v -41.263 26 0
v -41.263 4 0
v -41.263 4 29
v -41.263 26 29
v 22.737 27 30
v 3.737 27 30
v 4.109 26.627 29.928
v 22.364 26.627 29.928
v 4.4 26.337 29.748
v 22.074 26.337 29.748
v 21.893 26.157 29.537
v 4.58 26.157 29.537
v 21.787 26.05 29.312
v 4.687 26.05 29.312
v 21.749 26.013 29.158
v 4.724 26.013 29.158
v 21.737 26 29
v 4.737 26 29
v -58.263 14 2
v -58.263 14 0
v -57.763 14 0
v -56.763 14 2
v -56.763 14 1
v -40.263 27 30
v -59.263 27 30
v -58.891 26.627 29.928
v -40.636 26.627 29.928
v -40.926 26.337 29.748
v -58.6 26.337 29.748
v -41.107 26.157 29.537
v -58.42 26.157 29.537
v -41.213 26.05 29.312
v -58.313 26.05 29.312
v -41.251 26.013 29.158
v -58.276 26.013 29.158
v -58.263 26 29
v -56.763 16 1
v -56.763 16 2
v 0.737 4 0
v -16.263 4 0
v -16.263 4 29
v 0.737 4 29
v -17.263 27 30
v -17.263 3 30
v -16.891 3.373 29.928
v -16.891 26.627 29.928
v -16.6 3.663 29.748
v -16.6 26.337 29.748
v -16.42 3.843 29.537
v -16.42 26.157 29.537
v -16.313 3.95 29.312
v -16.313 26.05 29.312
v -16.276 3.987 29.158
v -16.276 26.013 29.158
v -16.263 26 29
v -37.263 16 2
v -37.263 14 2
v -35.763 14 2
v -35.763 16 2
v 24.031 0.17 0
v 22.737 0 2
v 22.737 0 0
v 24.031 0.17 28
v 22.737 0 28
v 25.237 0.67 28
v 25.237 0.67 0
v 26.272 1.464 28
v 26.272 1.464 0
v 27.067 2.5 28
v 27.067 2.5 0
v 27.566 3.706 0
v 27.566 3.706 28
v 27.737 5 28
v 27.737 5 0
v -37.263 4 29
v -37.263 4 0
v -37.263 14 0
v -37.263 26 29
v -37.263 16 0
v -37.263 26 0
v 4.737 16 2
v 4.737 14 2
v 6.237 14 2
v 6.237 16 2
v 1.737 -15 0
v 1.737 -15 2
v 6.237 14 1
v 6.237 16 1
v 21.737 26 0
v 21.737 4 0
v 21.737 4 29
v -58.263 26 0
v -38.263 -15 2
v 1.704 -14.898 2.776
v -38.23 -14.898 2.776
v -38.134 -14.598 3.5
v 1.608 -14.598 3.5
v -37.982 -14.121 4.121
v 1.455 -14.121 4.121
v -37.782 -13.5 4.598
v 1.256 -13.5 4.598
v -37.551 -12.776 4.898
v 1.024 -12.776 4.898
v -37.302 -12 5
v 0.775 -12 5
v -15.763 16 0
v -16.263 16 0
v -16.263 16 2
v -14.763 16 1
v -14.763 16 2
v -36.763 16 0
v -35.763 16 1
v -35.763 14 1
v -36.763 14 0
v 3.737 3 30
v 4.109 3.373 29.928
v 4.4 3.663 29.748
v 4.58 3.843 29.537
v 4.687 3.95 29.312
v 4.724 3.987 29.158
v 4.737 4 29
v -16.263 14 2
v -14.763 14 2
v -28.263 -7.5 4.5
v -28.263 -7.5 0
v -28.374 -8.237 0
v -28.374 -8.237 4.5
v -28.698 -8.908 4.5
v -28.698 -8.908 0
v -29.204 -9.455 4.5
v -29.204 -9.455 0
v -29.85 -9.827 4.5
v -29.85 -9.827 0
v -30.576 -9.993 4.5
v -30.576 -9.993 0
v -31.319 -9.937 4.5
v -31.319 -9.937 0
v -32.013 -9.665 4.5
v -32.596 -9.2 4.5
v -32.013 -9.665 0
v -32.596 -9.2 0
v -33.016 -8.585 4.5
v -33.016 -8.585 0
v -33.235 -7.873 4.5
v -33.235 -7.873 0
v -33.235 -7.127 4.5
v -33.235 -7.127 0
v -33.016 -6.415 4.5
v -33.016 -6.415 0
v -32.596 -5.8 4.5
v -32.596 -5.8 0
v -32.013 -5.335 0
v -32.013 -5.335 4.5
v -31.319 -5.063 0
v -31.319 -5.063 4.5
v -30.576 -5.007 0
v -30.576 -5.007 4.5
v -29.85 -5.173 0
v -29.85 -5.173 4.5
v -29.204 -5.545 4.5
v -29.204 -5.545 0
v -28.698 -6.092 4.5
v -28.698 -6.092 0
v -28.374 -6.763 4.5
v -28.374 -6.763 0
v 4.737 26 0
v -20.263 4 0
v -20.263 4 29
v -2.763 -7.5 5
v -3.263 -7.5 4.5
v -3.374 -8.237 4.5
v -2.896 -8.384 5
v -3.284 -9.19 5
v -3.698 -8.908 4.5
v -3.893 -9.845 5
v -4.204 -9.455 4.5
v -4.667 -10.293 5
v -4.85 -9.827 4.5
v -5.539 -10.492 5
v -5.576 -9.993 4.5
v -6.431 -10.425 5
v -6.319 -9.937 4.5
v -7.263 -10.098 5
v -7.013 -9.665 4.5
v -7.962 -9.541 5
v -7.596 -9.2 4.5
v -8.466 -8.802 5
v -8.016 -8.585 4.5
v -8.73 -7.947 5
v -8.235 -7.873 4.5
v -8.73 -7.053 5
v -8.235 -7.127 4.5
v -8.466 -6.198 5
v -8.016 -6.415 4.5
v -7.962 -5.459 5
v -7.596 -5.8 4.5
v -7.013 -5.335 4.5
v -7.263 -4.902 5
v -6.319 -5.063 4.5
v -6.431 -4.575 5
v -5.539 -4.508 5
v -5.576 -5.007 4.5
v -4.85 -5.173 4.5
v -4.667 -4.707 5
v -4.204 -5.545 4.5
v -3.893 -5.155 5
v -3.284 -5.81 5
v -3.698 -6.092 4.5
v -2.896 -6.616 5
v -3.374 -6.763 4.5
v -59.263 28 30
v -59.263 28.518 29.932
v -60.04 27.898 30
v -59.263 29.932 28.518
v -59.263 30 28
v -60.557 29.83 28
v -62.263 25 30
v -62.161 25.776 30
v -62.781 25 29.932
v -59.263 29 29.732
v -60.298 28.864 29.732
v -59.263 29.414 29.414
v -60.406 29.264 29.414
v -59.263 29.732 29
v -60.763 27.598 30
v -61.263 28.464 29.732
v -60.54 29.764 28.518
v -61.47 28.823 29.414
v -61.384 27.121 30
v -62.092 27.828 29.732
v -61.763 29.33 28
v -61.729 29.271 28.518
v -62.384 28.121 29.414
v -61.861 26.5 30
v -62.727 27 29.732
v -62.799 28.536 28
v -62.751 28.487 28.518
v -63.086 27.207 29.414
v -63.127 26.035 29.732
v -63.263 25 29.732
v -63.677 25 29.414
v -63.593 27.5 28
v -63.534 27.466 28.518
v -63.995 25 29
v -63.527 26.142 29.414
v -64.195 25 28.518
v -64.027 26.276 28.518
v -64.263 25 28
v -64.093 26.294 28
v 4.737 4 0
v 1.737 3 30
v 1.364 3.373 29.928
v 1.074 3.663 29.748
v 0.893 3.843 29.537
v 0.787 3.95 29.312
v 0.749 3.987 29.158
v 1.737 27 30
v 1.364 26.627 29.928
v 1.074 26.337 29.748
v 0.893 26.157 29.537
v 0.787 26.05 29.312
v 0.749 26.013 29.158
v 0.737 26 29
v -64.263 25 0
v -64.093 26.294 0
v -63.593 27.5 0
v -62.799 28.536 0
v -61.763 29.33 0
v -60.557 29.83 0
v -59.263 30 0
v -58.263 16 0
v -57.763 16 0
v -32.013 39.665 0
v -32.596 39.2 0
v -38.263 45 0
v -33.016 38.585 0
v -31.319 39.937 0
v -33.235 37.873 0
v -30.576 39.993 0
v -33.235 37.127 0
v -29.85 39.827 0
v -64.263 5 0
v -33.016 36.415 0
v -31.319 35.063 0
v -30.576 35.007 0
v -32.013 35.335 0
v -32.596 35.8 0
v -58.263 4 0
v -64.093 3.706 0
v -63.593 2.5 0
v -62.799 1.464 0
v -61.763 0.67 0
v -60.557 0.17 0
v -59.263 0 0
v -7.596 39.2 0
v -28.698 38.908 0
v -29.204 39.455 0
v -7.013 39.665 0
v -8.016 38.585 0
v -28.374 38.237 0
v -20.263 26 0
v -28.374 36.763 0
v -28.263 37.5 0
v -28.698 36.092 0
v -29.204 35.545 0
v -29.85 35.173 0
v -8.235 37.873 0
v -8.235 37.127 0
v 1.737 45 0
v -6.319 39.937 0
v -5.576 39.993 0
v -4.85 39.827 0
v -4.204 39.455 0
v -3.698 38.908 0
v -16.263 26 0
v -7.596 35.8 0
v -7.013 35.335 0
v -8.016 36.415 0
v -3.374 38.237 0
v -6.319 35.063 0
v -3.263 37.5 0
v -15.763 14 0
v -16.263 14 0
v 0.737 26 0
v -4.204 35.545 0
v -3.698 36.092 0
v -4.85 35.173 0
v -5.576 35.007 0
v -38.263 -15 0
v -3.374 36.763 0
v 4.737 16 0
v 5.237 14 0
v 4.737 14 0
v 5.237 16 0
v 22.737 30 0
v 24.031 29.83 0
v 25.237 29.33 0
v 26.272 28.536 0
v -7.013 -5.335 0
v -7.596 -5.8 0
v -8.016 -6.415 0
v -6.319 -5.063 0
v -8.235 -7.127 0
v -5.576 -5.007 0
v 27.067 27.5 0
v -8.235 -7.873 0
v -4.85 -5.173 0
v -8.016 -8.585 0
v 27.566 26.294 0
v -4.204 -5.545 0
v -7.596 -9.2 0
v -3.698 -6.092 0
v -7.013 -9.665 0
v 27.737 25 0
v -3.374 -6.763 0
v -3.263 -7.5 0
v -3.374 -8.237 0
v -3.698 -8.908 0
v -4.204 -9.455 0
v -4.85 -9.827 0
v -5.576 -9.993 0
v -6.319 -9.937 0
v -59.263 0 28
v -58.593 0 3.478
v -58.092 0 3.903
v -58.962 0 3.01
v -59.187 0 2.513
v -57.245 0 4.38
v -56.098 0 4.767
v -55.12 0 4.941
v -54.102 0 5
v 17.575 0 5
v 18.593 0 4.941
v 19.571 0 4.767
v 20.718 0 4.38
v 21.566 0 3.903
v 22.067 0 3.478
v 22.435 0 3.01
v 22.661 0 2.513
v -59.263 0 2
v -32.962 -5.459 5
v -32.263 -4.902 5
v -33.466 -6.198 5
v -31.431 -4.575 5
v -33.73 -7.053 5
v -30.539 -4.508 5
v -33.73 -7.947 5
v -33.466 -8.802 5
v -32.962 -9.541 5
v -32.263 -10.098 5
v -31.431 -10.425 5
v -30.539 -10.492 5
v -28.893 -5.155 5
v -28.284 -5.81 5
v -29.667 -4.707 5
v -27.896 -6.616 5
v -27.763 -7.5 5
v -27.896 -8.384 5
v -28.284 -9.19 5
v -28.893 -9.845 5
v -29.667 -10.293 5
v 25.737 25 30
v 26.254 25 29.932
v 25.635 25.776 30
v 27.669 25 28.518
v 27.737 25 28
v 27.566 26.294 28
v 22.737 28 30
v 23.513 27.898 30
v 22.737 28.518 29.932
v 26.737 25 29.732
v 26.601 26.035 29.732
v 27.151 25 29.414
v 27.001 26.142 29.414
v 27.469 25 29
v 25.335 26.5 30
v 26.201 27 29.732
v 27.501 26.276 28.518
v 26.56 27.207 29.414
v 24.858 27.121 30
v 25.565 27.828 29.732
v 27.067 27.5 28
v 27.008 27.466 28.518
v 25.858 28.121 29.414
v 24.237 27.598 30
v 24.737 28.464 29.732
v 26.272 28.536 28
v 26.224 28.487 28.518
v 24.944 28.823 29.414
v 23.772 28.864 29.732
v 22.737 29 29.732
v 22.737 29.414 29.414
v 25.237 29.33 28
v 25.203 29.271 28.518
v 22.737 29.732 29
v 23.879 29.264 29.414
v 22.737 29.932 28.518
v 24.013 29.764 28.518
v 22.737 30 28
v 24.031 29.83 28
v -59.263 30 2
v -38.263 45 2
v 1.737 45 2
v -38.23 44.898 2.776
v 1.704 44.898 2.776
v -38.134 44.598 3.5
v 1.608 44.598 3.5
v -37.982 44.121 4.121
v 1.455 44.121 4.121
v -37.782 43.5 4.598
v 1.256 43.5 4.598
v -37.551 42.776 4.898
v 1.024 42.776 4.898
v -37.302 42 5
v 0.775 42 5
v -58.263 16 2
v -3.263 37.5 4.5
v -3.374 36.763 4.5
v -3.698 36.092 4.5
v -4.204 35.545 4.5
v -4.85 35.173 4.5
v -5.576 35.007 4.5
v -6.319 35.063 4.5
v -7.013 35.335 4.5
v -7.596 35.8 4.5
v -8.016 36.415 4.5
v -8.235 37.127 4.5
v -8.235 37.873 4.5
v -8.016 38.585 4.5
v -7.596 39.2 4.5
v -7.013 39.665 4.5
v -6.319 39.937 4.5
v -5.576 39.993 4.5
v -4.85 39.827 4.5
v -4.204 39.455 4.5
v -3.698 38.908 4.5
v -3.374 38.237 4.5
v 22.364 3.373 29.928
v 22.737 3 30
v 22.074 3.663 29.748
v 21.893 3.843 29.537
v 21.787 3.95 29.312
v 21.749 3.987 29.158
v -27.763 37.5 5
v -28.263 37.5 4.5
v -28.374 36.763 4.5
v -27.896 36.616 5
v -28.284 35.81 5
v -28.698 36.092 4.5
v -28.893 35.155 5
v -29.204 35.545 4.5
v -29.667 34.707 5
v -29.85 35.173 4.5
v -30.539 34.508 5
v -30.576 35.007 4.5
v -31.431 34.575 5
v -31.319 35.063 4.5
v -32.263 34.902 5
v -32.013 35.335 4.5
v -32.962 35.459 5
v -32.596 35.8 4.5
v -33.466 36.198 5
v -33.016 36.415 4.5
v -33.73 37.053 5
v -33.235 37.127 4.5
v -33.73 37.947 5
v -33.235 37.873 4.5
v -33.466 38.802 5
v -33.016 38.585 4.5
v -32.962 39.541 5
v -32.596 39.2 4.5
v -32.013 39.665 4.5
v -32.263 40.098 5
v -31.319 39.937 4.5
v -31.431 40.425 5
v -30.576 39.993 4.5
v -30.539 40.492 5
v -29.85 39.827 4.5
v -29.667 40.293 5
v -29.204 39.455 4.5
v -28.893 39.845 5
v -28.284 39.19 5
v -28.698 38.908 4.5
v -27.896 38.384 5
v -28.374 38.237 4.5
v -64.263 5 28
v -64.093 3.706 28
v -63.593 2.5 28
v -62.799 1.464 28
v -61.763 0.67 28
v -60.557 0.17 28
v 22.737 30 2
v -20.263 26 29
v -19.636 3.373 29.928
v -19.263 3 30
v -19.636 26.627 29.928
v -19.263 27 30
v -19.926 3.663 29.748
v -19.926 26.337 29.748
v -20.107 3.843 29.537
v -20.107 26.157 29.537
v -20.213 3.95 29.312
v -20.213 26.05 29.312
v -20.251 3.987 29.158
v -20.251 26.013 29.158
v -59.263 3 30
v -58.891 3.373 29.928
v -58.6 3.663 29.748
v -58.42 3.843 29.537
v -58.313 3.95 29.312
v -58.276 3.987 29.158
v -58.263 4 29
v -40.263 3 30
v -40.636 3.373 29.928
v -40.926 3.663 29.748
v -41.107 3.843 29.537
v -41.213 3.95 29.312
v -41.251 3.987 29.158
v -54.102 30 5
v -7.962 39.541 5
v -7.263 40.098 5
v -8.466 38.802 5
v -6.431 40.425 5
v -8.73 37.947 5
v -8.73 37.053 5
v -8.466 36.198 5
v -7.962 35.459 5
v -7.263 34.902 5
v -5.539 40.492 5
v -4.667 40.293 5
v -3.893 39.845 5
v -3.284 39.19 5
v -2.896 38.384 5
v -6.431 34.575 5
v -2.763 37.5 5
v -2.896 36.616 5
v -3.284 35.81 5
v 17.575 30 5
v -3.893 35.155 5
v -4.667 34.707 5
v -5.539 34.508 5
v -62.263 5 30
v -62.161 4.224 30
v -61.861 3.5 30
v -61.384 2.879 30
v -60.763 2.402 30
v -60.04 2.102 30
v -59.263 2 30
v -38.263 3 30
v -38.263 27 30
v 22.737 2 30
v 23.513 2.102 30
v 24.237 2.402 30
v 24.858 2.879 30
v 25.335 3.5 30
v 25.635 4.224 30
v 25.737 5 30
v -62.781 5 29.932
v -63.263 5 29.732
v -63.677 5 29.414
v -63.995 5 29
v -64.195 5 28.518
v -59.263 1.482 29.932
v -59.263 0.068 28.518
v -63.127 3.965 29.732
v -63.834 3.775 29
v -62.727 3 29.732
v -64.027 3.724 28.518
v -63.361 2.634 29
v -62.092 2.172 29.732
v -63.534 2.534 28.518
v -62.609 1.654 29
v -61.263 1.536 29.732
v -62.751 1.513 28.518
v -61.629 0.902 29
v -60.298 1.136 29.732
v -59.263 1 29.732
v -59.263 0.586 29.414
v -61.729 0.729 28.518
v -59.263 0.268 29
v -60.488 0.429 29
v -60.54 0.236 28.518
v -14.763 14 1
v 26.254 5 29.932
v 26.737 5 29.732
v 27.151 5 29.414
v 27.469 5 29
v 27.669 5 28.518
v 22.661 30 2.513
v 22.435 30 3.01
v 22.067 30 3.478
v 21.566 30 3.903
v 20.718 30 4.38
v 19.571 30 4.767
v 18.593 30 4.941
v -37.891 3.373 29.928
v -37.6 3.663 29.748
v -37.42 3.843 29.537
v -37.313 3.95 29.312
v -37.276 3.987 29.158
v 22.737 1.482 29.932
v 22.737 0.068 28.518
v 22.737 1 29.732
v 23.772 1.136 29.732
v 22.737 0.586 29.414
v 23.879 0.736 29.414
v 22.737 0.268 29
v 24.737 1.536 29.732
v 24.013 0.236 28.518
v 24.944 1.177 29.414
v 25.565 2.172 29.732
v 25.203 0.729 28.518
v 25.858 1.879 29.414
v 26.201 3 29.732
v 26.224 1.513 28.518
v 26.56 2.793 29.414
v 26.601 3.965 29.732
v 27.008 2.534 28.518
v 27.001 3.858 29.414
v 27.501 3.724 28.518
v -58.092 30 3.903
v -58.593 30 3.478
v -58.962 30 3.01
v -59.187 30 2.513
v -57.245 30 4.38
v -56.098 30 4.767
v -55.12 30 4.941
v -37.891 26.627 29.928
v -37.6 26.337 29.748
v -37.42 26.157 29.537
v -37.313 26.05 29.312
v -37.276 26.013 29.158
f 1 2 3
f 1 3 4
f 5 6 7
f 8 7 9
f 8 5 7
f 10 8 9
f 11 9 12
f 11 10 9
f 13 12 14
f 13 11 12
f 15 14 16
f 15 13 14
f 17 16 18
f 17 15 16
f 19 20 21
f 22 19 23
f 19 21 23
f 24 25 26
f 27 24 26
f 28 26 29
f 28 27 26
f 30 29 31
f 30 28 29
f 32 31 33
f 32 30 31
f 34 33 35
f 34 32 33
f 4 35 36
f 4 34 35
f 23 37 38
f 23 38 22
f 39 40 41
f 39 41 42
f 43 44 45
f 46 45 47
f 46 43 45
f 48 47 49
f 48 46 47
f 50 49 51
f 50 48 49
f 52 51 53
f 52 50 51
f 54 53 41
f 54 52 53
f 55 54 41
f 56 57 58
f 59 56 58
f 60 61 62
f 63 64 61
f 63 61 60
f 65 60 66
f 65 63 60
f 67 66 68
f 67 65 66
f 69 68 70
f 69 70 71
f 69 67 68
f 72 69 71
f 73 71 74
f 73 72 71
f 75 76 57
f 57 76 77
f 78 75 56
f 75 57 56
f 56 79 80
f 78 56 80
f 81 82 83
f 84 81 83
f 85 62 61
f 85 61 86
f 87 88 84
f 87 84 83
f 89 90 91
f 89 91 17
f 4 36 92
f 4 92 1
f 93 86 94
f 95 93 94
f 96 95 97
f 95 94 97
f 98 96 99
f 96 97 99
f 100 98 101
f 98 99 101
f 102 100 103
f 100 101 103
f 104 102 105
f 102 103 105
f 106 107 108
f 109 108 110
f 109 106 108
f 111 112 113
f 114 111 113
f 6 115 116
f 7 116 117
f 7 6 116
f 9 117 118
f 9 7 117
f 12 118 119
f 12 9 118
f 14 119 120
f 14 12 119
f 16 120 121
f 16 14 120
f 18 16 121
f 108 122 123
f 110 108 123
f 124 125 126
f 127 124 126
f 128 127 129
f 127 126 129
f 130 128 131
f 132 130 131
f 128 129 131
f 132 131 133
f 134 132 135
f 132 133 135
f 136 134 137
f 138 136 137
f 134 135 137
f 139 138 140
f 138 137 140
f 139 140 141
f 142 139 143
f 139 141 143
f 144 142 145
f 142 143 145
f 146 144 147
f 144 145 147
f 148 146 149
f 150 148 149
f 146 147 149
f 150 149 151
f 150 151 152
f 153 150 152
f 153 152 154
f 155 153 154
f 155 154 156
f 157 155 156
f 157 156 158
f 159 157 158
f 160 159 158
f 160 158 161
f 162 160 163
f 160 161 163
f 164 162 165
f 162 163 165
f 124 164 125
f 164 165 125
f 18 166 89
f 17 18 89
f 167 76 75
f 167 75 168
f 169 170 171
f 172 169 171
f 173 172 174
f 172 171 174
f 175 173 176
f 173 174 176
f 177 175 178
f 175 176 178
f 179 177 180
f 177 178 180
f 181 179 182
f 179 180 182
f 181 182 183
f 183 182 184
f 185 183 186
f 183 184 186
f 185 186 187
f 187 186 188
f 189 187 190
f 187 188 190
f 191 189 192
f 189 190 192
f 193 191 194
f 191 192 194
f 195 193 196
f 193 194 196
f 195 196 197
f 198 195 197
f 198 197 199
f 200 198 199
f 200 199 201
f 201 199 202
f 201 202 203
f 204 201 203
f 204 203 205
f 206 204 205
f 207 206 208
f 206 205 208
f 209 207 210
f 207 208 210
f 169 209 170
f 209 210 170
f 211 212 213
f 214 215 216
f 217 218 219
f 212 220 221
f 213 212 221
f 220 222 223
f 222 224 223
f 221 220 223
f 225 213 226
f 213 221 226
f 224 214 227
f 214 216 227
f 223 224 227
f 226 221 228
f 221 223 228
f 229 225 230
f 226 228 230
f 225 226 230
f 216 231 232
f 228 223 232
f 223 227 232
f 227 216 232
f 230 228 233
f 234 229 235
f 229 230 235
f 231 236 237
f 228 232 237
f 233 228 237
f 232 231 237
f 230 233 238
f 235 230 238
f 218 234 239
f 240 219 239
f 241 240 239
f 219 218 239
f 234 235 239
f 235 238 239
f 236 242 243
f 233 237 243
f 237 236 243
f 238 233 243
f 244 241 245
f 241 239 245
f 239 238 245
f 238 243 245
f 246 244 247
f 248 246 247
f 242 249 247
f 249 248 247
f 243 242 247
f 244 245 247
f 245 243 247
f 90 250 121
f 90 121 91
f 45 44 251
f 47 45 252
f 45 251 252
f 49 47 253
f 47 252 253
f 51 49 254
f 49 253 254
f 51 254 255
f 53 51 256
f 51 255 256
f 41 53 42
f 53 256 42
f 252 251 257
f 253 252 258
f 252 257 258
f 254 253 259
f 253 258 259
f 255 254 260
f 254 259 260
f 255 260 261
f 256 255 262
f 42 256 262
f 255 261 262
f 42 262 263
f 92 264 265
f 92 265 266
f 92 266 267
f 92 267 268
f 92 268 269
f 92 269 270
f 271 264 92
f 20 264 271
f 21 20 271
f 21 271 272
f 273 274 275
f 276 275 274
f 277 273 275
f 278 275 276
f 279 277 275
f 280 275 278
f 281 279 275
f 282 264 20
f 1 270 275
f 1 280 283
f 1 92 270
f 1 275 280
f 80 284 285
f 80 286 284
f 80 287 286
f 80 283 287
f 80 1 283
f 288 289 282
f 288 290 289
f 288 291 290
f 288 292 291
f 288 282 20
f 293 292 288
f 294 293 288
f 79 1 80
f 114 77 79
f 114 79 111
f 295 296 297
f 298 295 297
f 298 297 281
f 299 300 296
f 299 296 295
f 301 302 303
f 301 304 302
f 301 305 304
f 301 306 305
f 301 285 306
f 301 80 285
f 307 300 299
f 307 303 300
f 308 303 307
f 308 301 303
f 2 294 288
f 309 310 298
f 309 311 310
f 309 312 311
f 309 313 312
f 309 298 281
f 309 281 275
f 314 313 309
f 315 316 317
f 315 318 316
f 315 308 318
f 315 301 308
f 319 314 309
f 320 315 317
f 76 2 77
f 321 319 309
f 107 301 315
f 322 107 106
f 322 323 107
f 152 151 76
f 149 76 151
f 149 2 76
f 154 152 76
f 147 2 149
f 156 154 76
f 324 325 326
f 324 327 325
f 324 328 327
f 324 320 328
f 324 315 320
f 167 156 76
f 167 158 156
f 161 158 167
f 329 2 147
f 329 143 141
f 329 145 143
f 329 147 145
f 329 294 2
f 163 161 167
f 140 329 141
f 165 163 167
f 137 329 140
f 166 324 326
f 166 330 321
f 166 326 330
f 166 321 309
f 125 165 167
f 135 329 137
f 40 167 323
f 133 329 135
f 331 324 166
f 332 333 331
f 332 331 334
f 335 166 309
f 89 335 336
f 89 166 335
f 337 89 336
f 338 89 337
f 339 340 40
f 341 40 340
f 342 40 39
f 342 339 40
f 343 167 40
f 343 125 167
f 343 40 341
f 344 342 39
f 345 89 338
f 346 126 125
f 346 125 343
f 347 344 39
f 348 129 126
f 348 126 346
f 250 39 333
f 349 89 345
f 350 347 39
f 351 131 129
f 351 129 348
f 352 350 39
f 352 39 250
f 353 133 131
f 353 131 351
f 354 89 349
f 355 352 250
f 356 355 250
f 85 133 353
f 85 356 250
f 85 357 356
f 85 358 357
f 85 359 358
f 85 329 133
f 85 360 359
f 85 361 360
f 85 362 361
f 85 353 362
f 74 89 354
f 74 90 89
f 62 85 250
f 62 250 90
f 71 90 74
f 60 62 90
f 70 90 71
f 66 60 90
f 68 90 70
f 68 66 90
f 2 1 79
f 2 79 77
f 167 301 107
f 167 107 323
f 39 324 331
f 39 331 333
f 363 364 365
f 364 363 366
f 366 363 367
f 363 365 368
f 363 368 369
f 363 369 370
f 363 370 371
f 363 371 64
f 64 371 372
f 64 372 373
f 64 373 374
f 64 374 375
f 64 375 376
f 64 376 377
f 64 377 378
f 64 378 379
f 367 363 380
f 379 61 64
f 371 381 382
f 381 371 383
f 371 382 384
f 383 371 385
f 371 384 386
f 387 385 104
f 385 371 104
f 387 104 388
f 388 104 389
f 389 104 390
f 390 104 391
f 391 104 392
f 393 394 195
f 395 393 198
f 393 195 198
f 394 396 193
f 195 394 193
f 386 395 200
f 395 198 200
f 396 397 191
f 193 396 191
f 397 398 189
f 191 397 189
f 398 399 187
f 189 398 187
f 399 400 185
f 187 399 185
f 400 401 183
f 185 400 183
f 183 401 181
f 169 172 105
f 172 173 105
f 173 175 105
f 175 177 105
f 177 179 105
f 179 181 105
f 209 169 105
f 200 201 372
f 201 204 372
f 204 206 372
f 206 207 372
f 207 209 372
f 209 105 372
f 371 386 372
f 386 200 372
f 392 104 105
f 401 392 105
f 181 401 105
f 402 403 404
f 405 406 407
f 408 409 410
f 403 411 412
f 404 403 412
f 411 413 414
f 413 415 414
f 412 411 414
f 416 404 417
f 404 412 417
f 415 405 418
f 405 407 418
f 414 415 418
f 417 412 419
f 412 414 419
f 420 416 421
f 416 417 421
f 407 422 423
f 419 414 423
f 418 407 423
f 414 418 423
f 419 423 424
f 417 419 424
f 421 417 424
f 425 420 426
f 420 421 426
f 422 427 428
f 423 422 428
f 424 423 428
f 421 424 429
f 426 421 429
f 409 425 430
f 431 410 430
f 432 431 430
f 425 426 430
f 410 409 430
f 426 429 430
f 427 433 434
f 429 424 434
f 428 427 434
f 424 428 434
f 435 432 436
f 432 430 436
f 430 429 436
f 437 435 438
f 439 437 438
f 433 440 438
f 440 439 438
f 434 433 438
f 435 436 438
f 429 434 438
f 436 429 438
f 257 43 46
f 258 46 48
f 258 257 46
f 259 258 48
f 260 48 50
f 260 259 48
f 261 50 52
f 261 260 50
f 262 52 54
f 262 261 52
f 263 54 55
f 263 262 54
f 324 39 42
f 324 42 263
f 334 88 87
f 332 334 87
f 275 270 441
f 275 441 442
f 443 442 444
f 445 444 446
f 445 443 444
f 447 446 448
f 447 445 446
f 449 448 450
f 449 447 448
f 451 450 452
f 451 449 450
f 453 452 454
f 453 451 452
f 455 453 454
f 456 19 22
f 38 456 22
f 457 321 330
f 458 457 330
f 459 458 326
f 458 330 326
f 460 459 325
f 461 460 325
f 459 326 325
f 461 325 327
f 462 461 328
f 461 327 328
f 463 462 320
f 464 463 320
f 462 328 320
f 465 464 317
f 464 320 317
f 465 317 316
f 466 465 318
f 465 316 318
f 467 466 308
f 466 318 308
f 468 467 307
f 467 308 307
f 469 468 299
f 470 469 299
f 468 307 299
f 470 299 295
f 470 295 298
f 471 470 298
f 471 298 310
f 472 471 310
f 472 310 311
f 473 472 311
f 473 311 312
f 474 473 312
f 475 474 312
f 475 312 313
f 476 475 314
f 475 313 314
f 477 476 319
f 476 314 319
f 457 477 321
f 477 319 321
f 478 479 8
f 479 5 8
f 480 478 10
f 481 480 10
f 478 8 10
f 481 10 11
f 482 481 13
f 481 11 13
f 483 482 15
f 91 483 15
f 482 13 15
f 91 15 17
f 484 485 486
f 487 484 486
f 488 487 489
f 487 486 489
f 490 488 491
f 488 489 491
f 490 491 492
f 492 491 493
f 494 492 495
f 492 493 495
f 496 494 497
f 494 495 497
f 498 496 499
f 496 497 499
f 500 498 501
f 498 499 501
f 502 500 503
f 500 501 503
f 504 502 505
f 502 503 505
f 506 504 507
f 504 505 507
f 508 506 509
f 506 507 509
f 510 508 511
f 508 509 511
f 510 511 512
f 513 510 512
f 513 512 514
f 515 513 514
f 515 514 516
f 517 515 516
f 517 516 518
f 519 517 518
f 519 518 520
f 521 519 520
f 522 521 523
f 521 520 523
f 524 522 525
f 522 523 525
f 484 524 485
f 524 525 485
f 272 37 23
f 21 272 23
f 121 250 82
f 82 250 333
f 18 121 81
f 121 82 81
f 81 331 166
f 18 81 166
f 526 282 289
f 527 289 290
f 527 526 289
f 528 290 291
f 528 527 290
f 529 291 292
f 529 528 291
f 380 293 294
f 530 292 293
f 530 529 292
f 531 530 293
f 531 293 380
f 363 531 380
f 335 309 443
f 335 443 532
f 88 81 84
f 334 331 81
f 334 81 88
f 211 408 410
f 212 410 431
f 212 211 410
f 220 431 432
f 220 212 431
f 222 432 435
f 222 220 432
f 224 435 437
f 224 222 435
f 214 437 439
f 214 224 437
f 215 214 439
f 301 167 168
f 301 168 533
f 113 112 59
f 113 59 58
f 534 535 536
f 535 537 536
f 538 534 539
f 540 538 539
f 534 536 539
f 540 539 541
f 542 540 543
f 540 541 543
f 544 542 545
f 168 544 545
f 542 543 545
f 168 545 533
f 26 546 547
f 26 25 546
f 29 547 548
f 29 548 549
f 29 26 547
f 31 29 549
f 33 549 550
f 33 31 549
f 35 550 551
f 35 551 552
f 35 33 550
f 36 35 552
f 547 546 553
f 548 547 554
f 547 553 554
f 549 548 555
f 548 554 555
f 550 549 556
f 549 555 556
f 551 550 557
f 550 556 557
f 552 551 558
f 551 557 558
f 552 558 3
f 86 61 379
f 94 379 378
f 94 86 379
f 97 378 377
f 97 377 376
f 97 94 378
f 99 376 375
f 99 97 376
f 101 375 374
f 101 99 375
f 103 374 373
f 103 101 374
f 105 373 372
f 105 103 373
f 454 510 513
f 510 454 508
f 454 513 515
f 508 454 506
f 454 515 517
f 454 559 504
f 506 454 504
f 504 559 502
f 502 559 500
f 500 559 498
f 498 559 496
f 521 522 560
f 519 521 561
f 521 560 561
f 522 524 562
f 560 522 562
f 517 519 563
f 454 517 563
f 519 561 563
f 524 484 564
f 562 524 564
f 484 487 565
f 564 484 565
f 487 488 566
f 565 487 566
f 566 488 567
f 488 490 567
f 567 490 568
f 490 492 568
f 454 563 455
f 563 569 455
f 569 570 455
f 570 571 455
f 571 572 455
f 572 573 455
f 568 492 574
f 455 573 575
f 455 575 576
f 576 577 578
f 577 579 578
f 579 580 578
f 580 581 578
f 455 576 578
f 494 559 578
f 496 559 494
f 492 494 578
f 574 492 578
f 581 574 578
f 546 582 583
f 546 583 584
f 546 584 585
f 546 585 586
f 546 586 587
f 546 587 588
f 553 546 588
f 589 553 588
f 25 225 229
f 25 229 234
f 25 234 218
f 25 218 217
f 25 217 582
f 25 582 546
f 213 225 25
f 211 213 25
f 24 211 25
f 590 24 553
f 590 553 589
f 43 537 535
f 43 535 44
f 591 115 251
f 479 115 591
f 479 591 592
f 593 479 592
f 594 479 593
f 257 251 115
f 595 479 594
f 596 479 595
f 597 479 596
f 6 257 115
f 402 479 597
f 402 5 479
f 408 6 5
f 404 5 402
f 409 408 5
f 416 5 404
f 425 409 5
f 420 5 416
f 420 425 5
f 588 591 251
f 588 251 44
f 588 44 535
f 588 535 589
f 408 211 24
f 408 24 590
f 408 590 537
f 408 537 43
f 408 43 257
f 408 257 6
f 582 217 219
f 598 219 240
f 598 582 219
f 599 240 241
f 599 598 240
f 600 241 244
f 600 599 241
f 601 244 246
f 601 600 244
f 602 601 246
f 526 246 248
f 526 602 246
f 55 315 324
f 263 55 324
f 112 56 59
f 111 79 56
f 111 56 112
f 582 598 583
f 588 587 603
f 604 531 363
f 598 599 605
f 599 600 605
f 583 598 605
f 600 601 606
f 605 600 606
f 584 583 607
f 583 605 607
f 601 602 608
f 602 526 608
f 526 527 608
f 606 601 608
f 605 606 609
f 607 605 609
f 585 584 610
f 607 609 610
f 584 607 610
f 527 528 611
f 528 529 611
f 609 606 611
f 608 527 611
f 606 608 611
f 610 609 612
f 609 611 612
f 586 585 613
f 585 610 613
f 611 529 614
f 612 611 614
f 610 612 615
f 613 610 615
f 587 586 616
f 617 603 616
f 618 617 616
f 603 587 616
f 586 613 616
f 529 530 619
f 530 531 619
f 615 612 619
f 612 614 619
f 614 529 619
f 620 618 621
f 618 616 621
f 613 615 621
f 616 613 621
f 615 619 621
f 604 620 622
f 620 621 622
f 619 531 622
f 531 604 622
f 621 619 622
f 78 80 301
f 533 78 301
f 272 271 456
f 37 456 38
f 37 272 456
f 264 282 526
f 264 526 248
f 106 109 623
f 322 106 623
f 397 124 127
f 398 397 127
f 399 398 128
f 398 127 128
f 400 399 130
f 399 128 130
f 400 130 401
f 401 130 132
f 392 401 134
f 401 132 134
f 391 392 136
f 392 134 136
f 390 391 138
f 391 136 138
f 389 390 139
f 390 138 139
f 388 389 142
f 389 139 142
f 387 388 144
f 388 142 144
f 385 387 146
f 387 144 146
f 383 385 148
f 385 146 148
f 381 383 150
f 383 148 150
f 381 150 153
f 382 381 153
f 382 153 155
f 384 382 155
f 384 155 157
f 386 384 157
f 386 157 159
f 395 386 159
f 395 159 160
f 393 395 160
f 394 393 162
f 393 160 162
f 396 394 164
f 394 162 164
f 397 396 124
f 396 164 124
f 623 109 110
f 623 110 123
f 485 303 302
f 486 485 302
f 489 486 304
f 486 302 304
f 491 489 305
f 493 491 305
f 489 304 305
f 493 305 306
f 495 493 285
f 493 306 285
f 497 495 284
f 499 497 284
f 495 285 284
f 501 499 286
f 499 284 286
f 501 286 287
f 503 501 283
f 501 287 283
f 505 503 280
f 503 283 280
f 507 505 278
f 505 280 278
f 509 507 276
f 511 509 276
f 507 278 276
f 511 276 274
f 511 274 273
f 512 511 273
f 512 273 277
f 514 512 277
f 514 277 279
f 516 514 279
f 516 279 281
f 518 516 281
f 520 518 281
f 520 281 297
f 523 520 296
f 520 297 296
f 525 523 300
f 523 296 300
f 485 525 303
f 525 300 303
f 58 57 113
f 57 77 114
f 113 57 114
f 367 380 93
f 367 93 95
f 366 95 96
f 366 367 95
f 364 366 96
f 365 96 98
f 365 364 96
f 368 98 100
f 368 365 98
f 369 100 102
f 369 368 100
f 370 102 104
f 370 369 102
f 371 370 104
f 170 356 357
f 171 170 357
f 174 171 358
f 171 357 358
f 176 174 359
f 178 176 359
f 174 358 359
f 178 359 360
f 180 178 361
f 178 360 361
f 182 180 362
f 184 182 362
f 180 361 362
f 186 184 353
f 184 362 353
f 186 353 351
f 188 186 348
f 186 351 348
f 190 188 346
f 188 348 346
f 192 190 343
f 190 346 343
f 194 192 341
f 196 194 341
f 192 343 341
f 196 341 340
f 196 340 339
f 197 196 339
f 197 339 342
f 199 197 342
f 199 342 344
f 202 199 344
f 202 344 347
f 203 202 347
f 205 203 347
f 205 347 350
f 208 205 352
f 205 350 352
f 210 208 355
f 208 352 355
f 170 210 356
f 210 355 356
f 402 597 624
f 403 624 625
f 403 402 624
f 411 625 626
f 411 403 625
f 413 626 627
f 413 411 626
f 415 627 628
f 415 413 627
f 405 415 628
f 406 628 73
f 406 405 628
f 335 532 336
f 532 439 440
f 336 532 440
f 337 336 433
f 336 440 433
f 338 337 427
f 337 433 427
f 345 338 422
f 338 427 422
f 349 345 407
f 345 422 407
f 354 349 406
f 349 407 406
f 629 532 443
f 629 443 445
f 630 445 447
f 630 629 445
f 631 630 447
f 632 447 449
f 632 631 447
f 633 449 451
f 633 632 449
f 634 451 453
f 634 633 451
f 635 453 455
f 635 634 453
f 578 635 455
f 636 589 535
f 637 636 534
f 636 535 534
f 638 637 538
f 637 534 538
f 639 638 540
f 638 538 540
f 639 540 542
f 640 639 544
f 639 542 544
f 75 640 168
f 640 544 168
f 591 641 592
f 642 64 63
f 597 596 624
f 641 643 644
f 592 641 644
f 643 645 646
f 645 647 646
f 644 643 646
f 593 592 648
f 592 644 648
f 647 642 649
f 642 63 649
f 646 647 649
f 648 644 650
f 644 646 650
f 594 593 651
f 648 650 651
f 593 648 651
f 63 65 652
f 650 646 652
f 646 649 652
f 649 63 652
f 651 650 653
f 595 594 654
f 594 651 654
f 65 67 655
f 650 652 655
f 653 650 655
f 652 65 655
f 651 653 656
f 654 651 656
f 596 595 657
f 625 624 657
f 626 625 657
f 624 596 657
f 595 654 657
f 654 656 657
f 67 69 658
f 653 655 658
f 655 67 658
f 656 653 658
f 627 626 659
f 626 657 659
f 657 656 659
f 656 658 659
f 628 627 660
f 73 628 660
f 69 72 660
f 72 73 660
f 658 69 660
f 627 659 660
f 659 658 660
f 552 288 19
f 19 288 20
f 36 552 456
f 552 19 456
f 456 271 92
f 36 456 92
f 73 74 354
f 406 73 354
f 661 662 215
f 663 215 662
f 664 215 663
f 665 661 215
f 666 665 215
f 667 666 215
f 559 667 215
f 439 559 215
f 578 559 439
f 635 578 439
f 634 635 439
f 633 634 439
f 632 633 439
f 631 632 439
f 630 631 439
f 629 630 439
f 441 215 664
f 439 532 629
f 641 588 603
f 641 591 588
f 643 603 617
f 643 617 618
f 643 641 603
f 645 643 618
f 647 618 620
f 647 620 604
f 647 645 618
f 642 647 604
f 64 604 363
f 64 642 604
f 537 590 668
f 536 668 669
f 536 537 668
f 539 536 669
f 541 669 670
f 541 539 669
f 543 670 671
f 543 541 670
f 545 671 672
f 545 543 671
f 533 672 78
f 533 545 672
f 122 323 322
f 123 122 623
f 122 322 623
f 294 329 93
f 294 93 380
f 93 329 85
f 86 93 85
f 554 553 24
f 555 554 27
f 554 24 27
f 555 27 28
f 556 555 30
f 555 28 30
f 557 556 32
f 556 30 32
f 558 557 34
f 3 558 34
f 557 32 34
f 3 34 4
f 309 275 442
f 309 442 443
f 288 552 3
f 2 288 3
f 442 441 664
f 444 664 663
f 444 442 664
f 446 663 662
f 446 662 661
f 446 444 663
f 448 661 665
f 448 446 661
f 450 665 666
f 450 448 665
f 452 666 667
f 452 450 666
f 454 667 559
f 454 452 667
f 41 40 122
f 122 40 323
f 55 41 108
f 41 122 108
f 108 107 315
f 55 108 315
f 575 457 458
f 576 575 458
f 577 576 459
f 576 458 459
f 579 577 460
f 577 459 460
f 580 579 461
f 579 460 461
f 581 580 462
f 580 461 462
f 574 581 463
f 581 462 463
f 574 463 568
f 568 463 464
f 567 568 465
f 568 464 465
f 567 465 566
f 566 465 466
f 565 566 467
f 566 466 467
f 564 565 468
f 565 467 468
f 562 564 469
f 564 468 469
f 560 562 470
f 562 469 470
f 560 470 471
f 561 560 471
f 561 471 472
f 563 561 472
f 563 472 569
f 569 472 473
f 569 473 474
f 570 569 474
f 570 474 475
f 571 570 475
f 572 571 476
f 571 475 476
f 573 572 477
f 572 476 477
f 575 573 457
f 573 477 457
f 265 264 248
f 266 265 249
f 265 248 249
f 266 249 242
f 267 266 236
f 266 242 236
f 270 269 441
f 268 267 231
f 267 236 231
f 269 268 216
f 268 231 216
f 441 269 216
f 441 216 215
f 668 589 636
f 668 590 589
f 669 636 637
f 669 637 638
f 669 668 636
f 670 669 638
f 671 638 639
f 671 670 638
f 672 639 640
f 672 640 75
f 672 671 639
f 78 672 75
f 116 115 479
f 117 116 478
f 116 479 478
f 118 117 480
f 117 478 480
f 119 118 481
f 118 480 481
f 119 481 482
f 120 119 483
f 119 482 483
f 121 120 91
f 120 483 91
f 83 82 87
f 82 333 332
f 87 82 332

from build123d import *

# Parameters (mm, degrees)
F0_W     = 92
F0_H     = 30
F0_W_2   = 17
F0_H_2   = 22
F1_DEPTH = 30
F2_R     = 5
F3_R     = 2
F4_R     = 1
F5_W     = 1.5
F5_H     = 2
F6_DEPTH = 2
F7_SIZE  = 1
F8_W     = 40
F8_H     = 15
F8_R     = 2.5
F9_DEPTH = 5
F10_R    = 3
F11_SIZE = 0.5


with BuildPart() as f1:
    # F0 (on Top) → F1 (new body)
    with BuildSketch(Plane.XY):
        with Locations((-18.263159, 15)):
            Rectangle(F0_W, F0_H)
        with Locations((-49.763159, 15)):
            Rectangle(F0_W_2, F0_H_2, mode=Mode.SUBTRACT)
        with Locations((-28.763159, 15)):
            Rectangle(F0_W_2, F0_H_2, mode=Mode.SUBTRACT)
        with Locations((-7.763159, 15)):
            Rectangle(F0_W_2, F0_H_2, mode=Mode.SUBTRACT)
        with Locations((13.236841, 15)):
            Rectangle(F0_W_2, F0_H_2, mode=Mode.SUBTRACT)
    extrude(amount=F1_DEPTH)

    # F2
    f2_edges = [f1.edges().sort_by_distance(p)[0] for p in [
        (27.736841, 0, 15),
        (27.736841, 30, 15),
        (-64.263159, 0, 15),
        (-64.263159, 30, 15),
    ]]
    fillet(f2_edges, radius=F2_R)

    # F3
    f3_edges = [f1.edges().sort_by_distance(p)[0] for p in [
        (-18.263159, 0, 30),
        (-18.263159, 30, 30),
    ]]
    fillet(f3_edges, radius=F3_R)

    # F4
    f4_edges = [f1.edges().sort_by_distance(p)[0] for p in [
        (-58.263159, 15, 30),
        (-49.763159, 4, 30),
        (-41.263159, 15, 30),
        (-49.763159, 26, 30),
        (-37.263159, 15, 30),
        (-28.763159, 26, 30),
        (-20.263159, 15, 30),
        (-28.763159, 4, 30),
        (-16.263159, 15, 30),
        (-7.763159, 26, 30),
        (0.736841, 15, 30),
        (-7.763159, 4, 30),
        (4.736841, 15, 30),
        (13.236841, 26, 30),
        (21.736841, 15, 30),
        (13.236841, 4, 30),
    ]]
    fillet(f4_edges, radius=F4_R)

    # F5 (on face) → F6 (join)
    with BuildSketch(Plane(origin=(0, 0, 0), x_dir=(1, 0, 0), z_dir=(0, 0, -1))):
        with Locations((-57.513159, -15)):
            Rectangle(F5_W, F5_H)
        with Locations((-36.513159, -15)):
            Rectangle(F5_W, F5_H)
        with Locations((-15.513159, -15)):
            Rectangle(F5_W, F5_H)
        with Locations((5.486841, -15)):
            Rectangle(F5_W, F5_H)
    extrude(amount=-F6_DEPTH)

    # F7
    f7_edges = [f1.edges().sort_by_distance(p)[0] for p in [
        (-56.763159, 15, 0),
        (-35.763159, 15, 0),
        (-14.763159, 15, 0),
        (6.236841, 15, 0),
    ]]
    chamfer(f7_edges, length=F7_SIZE)

    # F8 (on face) → F9 (join)
    with BuildSketch(Plane(origin=(0, 0, 0), x_dir=(1, 0, 0), z_dir=(0, 0, -1))):
        with Locations((-18.263159, 7.5)):
            Rectangle(F8_W, F8_H)
        with Locations((-30.763159, 7.5)):
            Circle(F8_R, mode=Mode.SUBTRACT)
        with Locations((-5.763159, 7.5)):
            Circle(F8_R, mode=Mode.SUBTRACT)
        Polygon((-59.263159, 0), (-38.263159, 0), (-38.263159, 15), align=None)
        Polygon((1.736841, 15), (1.736841, 0), (22.736841, 0), align=None)
        with Locations((-18.263159, -37.5)):
            Rectangle(F8_W, F8_H)
        with Locations((-30.763159, -37.5)):
            Circle(F8_R, mode=Mode.SUBTRACT)
        with Locations((-5.763159, -37.5)):
            Circle(F8_R, mode=Mode.SUBTRACT)
        Polygon((22.736841, -30), (1.736841, -30), (1.736841, -45), align=None)
        Polygon((-38.263159, -45), (-38.263159, -30), (-59.263159, -30), align=None)
    extrude(amount=-F9_DEPTH)

    # F10
    f10_edges = [f1.edges().sort_by_distance(p)[0] for p in [
        (12.236841, -7.5, 5),
        (-18.263159, -15, 5),
        (-48.763159, -7.5, 5),
        (12.236841, 37.5, 5),
        (-18.263159, 45, 5),
        (-48.763159, 37.5, 5),
    ]]
    fillet(f10_edges, radius=F10_R)

    # F11
    f11_edges = [f1.edges().sort_by_distance(p)[0] for p in [
        (-8.263159, 37.5, 5),
        (-33.263159, 37.5, 5),
        (-8.263159, -7.5, 5),
        (-33.263159, -7.5, 5),
    ]]
    chamfer(f11_edges, length=F11_SIZE)


solid = f1.part
